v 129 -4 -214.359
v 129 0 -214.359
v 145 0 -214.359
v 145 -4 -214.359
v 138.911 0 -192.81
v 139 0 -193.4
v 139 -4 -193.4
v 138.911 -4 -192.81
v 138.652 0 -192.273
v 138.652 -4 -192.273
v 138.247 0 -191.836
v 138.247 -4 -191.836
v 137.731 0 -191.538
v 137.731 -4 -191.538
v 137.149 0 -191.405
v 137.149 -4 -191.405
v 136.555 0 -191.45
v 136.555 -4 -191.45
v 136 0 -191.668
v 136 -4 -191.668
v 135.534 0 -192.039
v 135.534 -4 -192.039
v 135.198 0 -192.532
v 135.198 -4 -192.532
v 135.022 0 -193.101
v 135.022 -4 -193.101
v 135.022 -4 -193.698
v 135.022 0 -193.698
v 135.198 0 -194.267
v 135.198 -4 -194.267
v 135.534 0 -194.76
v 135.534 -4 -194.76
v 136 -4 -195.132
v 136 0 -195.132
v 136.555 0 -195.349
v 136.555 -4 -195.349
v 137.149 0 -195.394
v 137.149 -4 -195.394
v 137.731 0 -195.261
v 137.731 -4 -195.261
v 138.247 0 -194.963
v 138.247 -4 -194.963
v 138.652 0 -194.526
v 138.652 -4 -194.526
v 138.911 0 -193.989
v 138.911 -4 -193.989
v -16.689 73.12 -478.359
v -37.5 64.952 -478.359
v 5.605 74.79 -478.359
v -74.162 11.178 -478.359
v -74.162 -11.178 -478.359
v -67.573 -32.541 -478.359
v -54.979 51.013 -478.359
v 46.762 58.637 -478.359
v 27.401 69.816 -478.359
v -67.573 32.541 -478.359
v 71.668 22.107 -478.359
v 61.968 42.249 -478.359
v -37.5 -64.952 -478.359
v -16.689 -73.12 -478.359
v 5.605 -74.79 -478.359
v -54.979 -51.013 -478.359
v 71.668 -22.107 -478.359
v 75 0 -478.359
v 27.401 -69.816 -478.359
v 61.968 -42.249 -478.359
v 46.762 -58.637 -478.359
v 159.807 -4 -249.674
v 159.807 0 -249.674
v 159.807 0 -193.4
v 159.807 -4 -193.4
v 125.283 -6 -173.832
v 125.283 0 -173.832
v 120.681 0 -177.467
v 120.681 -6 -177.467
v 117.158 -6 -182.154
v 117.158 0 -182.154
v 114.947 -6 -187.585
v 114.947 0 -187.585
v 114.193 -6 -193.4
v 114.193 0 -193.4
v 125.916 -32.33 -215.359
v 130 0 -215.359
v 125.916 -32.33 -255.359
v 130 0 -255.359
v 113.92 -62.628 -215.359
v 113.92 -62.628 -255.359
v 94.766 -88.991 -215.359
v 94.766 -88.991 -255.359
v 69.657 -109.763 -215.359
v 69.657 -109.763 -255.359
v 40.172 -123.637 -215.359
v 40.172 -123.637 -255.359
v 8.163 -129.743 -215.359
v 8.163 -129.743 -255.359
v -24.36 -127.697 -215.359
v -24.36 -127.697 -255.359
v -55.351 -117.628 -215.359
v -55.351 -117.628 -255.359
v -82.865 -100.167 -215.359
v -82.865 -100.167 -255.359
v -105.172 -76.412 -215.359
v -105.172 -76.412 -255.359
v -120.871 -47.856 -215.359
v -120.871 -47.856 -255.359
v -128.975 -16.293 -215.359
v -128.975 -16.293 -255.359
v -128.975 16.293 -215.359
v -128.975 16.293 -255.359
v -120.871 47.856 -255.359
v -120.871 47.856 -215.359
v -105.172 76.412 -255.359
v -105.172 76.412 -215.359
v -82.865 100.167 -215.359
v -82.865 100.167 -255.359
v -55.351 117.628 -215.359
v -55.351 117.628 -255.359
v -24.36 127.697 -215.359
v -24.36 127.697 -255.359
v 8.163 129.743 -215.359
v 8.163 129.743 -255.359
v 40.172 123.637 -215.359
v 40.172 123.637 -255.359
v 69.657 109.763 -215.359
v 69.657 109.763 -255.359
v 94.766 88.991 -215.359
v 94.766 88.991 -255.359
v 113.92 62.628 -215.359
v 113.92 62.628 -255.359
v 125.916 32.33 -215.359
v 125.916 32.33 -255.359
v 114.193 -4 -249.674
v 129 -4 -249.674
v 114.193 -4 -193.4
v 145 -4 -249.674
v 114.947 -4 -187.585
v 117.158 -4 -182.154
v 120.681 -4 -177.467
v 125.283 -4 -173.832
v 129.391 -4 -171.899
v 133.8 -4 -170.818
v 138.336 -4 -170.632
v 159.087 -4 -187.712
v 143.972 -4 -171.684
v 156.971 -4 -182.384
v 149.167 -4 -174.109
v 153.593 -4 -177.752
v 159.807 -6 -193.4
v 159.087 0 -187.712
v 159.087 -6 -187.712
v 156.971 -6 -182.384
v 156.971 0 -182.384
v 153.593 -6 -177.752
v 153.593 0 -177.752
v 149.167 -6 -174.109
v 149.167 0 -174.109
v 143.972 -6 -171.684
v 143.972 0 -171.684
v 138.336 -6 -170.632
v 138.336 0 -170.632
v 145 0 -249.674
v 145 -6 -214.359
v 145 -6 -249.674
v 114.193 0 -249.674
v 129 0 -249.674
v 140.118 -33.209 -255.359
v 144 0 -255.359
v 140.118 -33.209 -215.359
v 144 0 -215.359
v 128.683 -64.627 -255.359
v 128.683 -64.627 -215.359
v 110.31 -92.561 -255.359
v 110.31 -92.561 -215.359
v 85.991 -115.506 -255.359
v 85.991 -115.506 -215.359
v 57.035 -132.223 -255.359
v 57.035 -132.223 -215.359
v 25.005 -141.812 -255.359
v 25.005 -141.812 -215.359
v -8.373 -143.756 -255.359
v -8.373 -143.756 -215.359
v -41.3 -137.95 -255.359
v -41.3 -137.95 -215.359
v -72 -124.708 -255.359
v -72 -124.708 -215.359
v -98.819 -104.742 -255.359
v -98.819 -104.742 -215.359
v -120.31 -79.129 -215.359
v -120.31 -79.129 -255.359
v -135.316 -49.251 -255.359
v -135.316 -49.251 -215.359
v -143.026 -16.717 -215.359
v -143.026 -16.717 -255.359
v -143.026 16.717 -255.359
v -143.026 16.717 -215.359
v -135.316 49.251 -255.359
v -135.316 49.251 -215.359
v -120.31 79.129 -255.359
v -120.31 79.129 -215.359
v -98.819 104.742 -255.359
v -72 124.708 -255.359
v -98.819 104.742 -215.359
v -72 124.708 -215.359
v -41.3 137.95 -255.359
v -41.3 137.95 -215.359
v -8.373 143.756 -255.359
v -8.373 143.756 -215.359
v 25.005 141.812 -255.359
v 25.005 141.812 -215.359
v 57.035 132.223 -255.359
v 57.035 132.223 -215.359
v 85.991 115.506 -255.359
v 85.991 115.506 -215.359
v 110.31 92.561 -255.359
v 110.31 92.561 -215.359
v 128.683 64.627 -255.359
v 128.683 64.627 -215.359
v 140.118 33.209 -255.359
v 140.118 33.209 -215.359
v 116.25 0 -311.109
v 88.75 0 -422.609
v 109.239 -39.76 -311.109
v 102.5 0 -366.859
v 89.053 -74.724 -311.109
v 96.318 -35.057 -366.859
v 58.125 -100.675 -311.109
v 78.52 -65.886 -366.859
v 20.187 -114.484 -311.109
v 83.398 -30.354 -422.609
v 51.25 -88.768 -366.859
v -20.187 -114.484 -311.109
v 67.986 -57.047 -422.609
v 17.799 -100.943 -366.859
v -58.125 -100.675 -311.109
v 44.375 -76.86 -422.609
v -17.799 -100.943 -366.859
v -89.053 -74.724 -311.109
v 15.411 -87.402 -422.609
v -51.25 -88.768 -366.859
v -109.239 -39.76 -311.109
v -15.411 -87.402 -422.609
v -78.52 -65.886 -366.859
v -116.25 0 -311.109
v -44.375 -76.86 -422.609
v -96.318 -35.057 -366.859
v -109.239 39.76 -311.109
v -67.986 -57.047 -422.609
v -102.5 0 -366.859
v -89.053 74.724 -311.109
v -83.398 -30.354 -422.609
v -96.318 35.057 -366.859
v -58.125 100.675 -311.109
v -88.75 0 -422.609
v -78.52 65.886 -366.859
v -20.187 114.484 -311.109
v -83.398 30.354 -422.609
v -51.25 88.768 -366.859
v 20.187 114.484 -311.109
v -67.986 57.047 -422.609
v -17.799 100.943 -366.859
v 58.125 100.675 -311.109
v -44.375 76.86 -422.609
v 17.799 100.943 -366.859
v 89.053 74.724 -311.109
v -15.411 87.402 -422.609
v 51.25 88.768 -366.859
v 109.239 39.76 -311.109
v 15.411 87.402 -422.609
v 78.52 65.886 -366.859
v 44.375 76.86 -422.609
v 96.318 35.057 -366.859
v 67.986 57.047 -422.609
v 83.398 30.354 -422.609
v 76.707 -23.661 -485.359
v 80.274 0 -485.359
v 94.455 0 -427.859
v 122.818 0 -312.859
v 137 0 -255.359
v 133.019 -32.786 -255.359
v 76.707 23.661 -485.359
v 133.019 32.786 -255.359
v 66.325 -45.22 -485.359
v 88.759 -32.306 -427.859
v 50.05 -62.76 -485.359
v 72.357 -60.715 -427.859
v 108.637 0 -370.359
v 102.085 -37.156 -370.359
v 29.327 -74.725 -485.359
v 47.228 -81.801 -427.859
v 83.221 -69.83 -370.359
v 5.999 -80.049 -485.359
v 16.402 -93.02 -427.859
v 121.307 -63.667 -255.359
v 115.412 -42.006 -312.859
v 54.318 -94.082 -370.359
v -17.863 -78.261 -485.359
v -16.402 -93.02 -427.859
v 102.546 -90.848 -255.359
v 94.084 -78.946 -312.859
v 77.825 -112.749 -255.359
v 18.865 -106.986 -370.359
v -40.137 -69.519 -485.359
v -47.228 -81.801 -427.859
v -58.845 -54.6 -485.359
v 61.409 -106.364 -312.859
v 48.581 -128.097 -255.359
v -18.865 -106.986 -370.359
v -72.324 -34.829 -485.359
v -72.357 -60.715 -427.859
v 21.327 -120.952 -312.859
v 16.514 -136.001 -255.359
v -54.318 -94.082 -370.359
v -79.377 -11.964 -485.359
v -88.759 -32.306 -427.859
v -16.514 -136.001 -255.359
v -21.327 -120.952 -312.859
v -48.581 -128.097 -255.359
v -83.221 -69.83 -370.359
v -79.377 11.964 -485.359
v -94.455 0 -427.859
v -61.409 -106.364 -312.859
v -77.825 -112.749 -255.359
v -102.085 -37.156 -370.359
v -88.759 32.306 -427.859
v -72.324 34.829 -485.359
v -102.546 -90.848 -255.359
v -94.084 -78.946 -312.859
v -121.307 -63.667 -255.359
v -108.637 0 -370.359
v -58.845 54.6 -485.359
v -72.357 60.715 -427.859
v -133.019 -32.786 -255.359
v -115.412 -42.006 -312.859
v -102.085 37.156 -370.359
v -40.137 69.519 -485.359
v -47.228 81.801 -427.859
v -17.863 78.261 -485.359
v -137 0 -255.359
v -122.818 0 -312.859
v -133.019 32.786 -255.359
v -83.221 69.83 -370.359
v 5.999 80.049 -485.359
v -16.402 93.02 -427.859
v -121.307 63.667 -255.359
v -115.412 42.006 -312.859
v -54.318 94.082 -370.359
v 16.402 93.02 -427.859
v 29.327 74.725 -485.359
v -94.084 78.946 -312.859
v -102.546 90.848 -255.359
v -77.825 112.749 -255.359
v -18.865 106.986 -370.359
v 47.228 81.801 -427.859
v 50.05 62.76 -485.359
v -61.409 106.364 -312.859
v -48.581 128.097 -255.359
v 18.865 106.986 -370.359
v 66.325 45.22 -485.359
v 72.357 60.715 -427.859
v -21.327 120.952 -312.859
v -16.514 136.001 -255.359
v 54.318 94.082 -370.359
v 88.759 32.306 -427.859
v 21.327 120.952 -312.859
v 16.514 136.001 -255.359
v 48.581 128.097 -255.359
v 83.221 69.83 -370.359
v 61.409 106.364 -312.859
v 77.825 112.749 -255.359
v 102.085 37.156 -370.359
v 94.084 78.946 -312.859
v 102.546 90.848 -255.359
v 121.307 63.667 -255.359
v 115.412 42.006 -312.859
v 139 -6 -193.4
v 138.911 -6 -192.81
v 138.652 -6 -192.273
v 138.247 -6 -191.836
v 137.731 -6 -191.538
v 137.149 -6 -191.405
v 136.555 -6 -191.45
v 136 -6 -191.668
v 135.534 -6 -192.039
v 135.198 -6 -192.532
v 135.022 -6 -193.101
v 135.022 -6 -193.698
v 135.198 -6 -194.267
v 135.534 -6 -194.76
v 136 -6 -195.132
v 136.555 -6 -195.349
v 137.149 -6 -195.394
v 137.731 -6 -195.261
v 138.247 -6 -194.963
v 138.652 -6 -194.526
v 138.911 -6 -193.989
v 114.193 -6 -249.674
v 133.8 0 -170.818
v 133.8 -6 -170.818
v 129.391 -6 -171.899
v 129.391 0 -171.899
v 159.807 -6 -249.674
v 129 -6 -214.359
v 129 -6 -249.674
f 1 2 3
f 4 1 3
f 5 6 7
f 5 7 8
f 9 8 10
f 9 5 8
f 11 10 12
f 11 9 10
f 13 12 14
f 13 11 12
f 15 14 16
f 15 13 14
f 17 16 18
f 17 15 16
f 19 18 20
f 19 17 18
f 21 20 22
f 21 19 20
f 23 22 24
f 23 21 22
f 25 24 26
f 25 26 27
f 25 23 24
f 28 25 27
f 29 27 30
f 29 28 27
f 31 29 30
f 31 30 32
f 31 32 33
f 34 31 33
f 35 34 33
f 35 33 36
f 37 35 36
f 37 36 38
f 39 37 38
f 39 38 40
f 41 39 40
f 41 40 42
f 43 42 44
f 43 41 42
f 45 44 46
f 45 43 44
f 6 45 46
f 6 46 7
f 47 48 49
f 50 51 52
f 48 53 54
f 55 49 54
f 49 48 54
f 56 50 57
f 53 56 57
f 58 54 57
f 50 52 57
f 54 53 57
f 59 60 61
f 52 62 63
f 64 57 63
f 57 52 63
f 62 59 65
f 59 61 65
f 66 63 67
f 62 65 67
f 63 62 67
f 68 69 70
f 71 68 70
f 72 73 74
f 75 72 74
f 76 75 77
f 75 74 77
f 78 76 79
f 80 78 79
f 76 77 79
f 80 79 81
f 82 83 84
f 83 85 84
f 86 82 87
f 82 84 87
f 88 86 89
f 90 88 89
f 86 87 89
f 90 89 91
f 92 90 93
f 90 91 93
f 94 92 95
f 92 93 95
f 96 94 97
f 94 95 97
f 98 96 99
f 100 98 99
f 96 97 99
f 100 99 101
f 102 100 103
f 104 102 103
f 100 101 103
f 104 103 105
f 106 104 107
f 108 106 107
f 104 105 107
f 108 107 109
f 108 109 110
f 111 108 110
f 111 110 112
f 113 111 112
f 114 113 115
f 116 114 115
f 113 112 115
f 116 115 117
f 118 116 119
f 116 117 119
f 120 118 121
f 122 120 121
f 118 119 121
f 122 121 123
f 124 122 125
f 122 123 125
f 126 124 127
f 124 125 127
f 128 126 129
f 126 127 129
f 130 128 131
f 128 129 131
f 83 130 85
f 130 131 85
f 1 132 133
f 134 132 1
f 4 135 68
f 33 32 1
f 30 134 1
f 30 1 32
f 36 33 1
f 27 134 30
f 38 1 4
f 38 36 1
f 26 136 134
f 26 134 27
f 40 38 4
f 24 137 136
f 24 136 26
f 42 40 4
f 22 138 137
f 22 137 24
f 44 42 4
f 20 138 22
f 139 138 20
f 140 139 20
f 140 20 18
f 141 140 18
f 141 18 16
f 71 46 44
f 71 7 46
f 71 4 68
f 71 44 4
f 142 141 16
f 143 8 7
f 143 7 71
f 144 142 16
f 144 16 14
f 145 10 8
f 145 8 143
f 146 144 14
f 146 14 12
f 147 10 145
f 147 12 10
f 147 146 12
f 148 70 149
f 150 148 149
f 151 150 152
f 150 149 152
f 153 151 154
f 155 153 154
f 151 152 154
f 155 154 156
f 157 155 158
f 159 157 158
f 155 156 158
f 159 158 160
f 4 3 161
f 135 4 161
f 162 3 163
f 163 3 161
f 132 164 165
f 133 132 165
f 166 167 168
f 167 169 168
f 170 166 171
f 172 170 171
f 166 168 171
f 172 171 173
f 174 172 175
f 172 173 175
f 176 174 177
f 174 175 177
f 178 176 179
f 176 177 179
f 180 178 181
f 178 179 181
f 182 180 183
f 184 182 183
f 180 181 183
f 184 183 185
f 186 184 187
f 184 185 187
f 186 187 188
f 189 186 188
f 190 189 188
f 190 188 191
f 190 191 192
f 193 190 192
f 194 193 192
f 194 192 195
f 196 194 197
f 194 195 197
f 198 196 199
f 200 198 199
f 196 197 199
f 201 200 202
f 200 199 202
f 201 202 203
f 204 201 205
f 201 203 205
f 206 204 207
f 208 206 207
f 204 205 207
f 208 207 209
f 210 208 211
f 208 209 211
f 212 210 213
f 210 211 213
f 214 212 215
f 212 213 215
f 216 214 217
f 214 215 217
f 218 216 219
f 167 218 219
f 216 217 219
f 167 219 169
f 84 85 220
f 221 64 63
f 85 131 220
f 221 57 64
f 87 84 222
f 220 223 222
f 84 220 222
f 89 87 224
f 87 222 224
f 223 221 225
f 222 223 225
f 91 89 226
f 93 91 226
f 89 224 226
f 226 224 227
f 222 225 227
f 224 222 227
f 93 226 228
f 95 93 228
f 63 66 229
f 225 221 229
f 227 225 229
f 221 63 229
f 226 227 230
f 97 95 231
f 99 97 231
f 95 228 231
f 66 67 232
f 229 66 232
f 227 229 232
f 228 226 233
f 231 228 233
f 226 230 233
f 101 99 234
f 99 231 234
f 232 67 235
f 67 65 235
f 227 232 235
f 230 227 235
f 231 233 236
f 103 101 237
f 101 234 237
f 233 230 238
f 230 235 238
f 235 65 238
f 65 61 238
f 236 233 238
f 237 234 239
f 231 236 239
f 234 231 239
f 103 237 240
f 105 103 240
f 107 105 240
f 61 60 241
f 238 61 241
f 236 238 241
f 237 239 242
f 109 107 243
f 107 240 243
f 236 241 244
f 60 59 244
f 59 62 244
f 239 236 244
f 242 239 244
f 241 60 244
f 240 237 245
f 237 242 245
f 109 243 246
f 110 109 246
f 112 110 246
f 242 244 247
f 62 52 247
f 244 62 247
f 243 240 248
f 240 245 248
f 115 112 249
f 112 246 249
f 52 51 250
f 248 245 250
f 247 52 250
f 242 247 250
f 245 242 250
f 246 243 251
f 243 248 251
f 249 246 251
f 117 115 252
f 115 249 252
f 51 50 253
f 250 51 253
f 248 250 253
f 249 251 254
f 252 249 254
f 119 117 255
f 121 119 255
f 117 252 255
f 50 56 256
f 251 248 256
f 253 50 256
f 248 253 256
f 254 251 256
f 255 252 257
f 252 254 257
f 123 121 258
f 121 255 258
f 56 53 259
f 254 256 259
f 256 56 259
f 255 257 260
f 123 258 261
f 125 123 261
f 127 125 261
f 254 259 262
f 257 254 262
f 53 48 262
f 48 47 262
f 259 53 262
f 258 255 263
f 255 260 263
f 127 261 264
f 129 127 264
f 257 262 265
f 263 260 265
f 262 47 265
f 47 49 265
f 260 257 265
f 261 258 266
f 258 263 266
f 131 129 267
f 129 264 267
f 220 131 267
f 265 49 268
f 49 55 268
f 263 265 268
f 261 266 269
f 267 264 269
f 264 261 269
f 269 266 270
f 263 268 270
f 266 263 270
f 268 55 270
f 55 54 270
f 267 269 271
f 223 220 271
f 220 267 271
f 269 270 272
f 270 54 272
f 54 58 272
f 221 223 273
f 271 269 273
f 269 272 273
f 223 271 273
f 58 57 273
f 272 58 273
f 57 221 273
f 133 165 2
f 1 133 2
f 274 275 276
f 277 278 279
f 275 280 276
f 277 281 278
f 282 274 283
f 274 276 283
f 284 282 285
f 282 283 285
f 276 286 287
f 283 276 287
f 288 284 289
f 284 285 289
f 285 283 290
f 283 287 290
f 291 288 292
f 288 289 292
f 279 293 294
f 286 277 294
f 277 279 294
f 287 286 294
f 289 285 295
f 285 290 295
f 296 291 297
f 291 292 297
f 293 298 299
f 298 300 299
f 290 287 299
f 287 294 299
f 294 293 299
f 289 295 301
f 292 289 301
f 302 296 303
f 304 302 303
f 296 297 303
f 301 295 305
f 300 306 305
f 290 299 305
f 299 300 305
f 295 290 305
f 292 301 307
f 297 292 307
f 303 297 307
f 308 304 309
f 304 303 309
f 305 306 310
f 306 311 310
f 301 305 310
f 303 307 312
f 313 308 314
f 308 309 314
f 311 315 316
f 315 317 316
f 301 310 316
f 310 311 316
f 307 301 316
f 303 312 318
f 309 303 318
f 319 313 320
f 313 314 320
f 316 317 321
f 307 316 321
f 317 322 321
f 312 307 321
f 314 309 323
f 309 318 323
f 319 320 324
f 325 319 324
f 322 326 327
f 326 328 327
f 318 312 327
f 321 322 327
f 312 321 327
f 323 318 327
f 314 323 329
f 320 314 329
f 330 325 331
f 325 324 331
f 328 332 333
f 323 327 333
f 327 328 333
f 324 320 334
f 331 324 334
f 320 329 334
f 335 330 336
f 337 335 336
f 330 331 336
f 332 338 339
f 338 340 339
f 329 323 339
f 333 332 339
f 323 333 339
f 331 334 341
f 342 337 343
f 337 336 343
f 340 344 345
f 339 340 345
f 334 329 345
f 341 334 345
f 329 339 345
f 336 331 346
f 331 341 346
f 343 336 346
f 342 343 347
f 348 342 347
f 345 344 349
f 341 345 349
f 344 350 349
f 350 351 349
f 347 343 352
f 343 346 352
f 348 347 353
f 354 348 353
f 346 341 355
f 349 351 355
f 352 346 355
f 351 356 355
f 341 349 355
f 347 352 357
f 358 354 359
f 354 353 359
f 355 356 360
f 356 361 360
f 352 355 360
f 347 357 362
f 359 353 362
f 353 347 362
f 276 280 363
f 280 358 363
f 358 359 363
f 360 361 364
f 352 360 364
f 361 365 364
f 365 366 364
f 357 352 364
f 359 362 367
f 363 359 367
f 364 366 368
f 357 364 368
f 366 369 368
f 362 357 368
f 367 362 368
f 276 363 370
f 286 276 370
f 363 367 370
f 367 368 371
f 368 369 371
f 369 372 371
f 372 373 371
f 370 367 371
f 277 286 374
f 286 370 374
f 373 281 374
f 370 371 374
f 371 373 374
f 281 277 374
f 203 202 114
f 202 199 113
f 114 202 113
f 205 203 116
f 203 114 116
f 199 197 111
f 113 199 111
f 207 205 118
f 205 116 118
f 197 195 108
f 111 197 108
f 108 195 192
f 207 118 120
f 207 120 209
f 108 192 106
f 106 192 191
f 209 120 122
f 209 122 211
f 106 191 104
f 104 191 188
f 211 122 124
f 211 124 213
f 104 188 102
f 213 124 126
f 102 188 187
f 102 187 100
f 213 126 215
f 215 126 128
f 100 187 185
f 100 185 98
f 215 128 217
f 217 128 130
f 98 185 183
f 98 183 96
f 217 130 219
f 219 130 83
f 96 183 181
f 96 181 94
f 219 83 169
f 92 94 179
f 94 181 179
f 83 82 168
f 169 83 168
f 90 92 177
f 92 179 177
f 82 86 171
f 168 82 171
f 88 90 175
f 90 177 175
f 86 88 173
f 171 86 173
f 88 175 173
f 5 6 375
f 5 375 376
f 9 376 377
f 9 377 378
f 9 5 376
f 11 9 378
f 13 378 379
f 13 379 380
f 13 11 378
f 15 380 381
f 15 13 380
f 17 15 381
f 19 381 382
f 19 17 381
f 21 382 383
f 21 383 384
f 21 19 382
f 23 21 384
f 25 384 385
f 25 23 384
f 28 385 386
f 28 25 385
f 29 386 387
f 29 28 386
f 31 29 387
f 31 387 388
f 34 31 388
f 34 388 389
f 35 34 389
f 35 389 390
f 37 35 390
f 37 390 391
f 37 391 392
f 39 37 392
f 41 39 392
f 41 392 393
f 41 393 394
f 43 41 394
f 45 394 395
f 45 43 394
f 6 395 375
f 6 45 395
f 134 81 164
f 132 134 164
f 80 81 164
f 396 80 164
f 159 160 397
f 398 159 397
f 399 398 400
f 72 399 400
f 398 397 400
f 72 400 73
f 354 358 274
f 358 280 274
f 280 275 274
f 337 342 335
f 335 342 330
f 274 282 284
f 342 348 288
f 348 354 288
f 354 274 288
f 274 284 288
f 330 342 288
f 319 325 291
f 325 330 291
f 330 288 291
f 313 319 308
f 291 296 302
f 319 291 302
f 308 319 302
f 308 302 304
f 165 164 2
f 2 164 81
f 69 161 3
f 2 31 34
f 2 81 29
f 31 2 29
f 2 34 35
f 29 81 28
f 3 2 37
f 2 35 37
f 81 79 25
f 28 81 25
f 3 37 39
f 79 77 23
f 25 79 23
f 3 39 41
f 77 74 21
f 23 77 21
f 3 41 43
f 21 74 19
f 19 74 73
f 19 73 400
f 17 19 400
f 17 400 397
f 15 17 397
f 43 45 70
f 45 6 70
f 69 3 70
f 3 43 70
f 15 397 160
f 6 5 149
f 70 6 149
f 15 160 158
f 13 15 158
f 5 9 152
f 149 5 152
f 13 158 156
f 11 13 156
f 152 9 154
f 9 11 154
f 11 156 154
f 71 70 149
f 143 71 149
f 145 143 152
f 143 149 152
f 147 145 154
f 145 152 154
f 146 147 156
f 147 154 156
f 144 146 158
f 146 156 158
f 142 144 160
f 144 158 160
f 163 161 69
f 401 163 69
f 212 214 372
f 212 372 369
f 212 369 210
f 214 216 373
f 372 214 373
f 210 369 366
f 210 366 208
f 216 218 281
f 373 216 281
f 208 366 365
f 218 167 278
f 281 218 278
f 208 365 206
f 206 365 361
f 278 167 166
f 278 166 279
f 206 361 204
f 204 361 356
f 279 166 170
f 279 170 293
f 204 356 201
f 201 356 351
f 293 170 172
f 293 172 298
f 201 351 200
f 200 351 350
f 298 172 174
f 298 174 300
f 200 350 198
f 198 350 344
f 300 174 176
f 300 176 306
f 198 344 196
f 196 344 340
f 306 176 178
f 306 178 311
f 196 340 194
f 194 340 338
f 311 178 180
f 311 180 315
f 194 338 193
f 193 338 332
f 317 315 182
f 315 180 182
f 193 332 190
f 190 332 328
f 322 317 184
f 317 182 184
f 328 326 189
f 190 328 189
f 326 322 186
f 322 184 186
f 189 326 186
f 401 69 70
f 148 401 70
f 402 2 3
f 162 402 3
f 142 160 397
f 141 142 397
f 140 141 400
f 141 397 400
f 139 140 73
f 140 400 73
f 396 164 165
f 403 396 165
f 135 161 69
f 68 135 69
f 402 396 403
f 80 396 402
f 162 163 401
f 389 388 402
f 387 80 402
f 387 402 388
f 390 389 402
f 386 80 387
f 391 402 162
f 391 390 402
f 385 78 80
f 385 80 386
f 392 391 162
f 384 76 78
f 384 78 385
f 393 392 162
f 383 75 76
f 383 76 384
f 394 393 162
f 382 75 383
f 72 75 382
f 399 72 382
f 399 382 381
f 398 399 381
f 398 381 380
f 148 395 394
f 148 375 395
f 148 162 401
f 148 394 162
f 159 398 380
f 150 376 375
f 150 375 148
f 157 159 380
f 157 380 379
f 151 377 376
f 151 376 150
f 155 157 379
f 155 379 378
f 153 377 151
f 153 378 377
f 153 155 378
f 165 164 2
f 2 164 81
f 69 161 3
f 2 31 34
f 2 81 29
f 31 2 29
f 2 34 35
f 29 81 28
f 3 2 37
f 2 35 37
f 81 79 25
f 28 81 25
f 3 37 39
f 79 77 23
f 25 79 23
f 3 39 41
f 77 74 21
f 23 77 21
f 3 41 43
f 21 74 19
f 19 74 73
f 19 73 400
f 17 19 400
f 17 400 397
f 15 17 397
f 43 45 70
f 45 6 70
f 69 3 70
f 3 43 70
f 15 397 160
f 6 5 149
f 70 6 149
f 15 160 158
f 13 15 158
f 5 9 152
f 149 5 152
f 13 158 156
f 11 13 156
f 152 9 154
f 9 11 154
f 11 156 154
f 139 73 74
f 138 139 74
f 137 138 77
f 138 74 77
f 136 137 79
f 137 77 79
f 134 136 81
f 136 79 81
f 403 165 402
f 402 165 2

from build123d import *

# Parameters (mm, degrees)
F0_R     = 2
F2_DEPTH = 6
F3_DEPTH = 4


with BuildPart() as f1:
    # F0 (on Front) → F1 (revolve)
    with BuildSketch(Plane.XZ):
        Polygon((75, -478.359111), (0, -478.359111), (0, -485.359111), (80.273543, -485.359111), (137, -255.359111), (130, -255.359111), align=None)
        Polygon((130, -215.359111), (130, -255.359111), (137, -255.359111), (144, -255.359111), (144, -215.359111), align=None)
    revolve(axis=Axis((0, 0, -16.237866), (0, 0, -1)))


with BuildPart() as f2:
    # F0 (on Front) → F2 (new body)
    with BuildSketch(Plane.XZ):
        with BuildLine():
            Line((145, -214.359111), (145, -249.67373))
            Line((145, -249.67373), (159.807055, -249.67373))
            Line((159.807055, -249.67373), (159.807055, -193.39957))
            ThreePointArc((159.807055, -193.39957), (153.59278, -177.752161), (138.336383, -170.631701))
            ThreePointArc((138.336383, -170.631701), (131.568499, -171.248711), (125.282876, -173.832486))
            ThreePointArc((125.282876, -173.832486), (117.15819, -182.153934), (114.192945, -193.39957))
            Line((114.192945, -193.39957), (114.192945, -249.67373))
            Line((114.192945, -249.67373), (129, -249.67373))
            Line((129, -249.67373), (129, -214.359111))
            Line((129, -214.359111), (145, -214.359111))
        make_face()
        with Locations((137, -193.39957)):
            Circle(F0_R, mode=Mode.SUBTRACT)
    extrude(amount=F2_DEPTH)


with BuildPart() as f3:
    # F0 (on Front) → F3 (new body)
    with BuildSketch(Plane.XZ):
        with BuildLine():
            Line((145, -214.359111), (145, -249.67373))
            Line((145, -249.67373), (159.807055, -249.67373))
            Line((159.807055, -249.67373), (159.807055, -193.39957))
            ThreePointArc((159.807055, -193.39957), (153.59278, -177.752161), (138.336383, -170.631701))
            ThreePointArc((138.336383, -170.631701), (131.568499, -171.248711), (125.282876, -173.832486))
            ThreePointArc((125.282876, -173.832486), (117.15819, -182.153934), (114.192945, -193.39957))
            Line((114.192945, -193.39957), (114.192945, -249.67373))
            Line((114.192945, -249.67373), (129, -249.67373))
            Line((129, -249.67373), (129, -214.359111))
            Line((129, -214.359111), (145, -214.359111))
        make_face()
        with Locations((137, -193.39957)):
            Circle(F0_R, mode=Mode.SUBTRACT)
    extrude(amount=F3_DEPTH)


solid = Compound([f1.part, f2.part, f3.part])
